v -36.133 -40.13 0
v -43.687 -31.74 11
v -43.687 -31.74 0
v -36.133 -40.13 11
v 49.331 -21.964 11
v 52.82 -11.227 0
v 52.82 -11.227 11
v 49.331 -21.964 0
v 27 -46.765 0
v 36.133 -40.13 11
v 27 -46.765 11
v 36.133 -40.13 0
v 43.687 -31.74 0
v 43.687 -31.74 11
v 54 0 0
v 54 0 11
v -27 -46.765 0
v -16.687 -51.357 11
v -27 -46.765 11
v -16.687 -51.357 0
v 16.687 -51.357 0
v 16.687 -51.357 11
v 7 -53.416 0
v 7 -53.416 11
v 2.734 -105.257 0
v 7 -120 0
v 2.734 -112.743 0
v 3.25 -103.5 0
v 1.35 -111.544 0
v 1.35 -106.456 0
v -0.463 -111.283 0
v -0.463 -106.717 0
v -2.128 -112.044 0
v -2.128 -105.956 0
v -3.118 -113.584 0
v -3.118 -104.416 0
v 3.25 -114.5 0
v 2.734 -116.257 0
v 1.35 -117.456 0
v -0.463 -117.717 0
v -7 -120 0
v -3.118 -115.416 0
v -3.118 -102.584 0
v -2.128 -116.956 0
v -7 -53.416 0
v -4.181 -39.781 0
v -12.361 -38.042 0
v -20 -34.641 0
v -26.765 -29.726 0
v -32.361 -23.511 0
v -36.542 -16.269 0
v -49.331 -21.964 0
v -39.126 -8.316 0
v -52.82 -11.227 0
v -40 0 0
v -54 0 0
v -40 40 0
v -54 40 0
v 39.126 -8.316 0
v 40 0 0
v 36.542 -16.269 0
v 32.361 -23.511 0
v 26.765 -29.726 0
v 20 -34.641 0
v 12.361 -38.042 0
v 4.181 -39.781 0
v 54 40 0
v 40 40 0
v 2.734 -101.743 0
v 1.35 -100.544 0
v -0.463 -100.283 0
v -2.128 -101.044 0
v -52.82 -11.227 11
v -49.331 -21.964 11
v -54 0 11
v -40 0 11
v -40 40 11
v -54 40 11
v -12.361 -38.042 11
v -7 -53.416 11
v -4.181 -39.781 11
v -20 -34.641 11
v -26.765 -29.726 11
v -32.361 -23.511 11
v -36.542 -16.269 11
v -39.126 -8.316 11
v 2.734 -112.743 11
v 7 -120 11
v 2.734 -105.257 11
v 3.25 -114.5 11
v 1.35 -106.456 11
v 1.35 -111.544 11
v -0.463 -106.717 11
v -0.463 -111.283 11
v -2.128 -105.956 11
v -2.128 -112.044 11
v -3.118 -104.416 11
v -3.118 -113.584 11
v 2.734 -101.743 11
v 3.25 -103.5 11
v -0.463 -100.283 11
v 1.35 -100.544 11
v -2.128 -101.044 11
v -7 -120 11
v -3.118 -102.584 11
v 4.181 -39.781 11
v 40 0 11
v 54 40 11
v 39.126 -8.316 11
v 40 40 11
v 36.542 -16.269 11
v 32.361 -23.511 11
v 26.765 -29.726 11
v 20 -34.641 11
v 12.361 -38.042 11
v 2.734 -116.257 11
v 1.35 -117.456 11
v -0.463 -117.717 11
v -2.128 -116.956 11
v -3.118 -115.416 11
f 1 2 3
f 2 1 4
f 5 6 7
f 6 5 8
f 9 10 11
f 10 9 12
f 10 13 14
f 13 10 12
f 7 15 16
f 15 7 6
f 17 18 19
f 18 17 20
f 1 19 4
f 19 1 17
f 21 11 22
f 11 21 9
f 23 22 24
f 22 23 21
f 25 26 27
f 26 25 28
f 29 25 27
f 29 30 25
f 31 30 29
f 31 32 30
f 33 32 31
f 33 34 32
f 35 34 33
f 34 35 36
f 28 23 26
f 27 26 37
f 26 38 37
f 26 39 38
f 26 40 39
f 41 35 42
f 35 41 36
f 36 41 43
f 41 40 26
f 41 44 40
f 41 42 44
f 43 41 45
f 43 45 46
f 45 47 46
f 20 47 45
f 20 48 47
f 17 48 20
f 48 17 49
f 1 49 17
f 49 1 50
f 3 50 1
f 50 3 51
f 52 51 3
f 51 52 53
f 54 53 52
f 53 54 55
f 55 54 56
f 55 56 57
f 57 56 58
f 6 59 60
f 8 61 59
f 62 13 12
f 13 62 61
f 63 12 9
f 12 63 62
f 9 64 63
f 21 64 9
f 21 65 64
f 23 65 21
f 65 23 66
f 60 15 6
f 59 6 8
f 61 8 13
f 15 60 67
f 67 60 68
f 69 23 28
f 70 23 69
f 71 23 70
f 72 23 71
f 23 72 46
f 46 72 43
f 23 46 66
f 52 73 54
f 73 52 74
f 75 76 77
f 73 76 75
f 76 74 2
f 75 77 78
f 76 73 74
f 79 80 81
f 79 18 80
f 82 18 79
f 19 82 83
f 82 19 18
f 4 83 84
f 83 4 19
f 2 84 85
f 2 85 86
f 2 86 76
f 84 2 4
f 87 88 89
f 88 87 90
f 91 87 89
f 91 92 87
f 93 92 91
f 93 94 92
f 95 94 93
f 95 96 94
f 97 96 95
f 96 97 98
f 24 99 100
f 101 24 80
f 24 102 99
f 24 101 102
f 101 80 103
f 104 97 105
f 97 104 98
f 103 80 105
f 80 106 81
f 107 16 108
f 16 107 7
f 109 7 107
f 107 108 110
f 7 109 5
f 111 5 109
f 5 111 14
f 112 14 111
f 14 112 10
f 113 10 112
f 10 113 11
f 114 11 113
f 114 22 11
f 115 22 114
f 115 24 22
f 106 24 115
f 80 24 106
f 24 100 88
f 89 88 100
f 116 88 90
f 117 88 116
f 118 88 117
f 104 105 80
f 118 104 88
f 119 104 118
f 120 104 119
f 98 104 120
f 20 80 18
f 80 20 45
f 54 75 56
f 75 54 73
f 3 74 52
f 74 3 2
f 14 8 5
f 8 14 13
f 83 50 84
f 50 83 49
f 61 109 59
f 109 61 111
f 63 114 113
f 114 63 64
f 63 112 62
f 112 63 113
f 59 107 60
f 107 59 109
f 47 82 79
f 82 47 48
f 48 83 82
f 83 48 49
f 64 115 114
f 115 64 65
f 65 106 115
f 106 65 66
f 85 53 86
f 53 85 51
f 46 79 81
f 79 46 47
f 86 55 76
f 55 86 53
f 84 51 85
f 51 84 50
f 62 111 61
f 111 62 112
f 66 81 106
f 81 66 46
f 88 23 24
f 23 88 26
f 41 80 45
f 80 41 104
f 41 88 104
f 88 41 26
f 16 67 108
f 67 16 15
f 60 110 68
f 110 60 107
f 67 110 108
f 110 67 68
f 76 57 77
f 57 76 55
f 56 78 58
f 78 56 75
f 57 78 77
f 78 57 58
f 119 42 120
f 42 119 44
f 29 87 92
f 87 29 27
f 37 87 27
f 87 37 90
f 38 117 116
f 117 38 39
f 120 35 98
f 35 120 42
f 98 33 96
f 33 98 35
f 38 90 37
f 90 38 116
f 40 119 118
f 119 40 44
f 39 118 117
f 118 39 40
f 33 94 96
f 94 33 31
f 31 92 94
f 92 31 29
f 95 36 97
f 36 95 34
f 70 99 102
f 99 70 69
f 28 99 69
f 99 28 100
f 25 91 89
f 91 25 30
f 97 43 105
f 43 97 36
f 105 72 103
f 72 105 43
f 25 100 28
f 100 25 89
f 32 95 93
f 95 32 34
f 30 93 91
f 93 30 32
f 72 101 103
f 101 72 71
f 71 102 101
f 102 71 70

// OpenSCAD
h=11;      // height
w=14;      // width
d=(5+1.5)/2; // diameter of the holes

difference()
{
  union()
  {
    // lower arc
    difference()
    {
      cylinder(h=h, r=(80+2*w)/2);
      translate([-(80+2*w)/2, 0, 0])
        cube([80+2*w, (80+2*w)/2, h]);
      cylinder(h=h, r=(80)/2);
    }

    // leg
    translate([-w/2,-80-80/2,0])
      cube([w, 80, h]);

    // forks
    translate([40, 0, 0])
      cube([w, 40, h]);
    translate([-40-w, 0, 0])
      cube([w, 40, h]);
  }

  // lower hole for screw
  translate([0, -80-34.5, -1])
    cylinder(h=h+2, r=d);
  // higher hole for screw
  translate([0, -80-34.5+11, -1])
    cylinder(h=h+2, r=d);
}
